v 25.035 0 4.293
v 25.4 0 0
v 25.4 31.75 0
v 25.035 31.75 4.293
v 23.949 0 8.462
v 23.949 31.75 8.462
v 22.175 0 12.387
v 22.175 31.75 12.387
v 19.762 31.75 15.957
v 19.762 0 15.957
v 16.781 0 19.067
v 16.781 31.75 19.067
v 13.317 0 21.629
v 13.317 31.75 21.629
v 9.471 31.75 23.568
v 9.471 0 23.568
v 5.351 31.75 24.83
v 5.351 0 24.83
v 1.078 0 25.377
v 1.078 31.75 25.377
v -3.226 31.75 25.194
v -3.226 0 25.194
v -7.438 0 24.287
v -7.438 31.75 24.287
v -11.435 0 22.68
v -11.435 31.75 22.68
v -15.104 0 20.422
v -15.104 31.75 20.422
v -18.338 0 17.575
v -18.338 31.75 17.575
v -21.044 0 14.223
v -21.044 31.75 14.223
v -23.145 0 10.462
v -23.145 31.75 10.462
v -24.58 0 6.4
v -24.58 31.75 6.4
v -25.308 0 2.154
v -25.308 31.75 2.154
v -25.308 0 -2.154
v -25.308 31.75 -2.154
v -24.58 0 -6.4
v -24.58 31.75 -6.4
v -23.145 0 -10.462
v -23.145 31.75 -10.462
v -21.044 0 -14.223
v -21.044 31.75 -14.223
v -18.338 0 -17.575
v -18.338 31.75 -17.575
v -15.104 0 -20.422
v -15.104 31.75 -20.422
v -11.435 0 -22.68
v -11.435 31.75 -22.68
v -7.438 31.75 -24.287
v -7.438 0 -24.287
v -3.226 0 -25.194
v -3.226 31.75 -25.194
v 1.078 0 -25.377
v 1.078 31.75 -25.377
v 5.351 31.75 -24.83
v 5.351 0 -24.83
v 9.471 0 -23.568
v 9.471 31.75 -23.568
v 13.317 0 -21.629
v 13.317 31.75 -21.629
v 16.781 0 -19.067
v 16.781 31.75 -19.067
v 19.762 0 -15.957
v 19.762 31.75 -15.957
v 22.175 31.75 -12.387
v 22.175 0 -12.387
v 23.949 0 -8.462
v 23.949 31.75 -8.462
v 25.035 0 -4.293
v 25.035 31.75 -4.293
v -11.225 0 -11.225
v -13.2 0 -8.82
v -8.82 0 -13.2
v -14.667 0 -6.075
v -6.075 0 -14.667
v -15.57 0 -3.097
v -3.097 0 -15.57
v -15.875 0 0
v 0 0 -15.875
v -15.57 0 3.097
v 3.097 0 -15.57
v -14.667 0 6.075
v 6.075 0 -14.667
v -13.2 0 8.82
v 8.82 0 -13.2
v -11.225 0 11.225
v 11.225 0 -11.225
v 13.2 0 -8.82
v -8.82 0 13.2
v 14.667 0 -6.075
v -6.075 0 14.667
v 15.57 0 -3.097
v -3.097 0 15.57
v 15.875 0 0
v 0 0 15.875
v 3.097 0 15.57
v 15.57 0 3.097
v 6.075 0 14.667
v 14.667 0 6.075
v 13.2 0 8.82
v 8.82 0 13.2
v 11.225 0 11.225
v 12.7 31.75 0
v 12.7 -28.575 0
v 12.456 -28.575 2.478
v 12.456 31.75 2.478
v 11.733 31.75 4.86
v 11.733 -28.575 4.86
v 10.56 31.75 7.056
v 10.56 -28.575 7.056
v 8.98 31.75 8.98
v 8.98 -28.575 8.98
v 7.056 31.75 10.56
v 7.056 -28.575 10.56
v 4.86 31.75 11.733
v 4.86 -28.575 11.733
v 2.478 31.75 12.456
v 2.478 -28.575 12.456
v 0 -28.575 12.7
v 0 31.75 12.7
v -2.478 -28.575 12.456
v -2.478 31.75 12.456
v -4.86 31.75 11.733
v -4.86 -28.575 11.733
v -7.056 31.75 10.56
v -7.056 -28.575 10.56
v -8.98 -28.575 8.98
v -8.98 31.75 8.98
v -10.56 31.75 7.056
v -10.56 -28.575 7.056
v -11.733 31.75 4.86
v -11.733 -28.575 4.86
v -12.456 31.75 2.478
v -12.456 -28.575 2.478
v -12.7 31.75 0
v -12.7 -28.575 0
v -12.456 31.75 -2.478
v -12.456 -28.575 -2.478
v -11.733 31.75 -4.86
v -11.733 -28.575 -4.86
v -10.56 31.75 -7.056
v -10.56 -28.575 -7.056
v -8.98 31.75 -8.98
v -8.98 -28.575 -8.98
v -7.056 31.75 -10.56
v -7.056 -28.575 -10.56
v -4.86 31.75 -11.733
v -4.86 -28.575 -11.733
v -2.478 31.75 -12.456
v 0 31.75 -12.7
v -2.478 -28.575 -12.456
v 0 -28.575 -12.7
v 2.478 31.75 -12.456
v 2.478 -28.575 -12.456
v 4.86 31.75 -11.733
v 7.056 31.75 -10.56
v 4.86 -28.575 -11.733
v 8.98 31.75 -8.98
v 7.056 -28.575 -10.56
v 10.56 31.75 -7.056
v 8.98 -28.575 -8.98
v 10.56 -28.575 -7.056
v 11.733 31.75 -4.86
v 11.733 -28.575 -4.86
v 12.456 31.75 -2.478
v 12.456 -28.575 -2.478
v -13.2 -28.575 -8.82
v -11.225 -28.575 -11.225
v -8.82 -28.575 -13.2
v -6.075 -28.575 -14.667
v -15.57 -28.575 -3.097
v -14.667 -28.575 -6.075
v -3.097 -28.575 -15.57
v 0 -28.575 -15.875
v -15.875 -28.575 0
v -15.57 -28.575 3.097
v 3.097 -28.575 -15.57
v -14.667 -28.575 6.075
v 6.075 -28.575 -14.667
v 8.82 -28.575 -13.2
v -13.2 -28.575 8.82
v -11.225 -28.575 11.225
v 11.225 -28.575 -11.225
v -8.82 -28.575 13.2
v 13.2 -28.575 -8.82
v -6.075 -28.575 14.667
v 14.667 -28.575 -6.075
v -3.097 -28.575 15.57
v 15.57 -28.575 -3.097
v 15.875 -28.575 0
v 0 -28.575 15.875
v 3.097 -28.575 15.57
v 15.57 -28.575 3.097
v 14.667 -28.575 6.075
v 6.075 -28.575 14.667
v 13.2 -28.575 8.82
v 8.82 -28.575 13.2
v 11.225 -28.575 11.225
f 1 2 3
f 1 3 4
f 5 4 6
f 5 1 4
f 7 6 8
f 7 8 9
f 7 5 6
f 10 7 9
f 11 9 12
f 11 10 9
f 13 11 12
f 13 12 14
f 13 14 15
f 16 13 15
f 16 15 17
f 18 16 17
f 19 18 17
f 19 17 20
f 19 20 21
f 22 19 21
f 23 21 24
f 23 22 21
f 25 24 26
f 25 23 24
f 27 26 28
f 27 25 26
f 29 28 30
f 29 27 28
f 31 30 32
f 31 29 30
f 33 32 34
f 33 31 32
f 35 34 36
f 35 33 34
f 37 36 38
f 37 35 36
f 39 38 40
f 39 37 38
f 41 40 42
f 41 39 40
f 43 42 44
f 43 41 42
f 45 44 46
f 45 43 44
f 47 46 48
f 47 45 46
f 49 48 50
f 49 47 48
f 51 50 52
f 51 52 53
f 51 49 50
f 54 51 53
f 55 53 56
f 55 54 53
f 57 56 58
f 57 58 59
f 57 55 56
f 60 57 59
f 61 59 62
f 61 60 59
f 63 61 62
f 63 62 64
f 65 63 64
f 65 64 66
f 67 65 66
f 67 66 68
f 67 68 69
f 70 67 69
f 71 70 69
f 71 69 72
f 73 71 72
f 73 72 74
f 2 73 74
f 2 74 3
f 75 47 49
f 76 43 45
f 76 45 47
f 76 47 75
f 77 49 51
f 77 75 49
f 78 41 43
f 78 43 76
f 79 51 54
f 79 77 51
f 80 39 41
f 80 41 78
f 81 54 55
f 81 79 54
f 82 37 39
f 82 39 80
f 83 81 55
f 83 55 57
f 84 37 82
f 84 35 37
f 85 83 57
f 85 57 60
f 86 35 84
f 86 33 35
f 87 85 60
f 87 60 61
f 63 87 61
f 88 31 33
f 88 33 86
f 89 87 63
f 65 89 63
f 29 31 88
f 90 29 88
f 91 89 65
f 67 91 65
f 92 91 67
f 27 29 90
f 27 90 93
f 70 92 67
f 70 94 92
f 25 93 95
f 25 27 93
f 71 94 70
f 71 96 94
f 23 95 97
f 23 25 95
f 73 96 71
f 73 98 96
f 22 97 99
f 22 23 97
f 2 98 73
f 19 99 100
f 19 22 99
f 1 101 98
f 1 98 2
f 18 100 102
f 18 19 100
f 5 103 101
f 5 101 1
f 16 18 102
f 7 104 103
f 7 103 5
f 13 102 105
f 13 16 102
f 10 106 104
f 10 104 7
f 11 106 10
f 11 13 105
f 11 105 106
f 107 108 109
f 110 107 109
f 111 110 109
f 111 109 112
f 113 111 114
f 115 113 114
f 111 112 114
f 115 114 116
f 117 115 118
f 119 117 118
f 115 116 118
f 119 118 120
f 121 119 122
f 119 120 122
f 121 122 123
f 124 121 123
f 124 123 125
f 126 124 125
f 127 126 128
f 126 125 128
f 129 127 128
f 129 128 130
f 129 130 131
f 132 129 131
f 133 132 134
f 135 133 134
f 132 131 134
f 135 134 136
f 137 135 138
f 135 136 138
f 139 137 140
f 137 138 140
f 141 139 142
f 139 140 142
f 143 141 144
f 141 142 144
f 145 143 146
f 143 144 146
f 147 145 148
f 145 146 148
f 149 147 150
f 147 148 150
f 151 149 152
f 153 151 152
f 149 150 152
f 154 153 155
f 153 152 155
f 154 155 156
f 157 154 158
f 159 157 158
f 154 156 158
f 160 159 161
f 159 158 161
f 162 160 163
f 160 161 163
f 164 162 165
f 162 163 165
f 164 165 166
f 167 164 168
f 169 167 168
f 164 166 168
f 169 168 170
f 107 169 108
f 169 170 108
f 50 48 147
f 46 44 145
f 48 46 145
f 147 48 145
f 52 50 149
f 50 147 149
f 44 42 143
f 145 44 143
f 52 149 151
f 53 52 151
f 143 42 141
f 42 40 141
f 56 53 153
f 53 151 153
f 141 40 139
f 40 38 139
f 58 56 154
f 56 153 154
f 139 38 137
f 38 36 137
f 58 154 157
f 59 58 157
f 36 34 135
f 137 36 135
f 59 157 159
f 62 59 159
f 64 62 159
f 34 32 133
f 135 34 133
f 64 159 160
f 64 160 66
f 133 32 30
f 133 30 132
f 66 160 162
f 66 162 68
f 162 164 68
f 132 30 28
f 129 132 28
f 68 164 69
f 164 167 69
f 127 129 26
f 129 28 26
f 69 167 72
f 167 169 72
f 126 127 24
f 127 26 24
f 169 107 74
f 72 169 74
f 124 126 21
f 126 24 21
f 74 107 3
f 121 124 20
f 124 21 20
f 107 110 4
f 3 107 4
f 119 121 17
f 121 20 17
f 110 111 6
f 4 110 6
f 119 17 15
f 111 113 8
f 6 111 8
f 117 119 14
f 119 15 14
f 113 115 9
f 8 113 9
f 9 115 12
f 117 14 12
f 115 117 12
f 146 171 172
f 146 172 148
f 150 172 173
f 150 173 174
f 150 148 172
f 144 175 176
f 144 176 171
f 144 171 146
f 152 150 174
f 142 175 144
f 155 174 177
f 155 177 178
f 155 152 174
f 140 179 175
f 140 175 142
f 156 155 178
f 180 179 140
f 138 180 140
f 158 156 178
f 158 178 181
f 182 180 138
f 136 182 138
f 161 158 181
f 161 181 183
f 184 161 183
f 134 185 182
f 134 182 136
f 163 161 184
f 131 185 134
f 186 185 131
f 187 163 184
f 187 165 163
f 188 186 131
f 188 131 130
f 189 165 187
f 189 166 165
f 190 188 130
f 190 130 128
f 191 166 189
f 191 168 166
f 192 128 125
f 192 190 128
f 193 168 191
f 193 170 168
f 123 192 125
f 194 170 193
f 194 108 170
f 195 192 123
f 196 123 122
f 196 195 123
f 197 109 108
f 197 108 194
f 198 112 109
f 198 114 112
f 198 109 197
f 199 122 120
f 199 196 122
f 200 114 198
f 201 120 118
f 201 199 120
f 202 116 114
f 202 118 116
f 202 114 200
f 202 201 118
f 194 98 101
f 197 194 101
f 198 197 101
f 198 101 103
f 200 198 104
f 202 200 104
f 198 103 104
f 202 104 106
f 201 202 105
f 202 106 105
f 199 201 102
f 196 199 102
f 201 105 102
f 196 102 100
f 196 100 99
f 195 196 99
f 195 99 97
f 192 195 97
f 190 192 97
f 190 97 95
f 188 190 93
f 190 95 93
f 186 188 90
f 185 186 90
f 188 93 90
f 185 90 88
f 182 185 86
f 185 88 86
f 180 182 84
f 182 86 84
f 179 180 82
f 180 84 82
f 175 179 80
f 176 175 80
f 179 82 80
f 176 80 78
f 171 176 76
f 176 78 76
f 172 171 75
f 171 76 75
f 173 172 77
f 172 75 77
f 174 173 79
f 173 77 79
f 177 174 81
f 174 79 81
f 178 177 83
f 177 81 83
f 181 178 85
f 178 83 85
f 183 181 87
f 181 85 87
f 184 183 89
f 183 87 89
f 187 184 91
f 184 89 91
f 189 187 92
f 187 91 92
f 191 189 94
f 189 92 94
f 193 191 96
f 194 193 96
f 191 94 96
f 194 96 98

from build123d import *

# Parameters (mm, degrees)
F0_R     = 25.4
F1_DEPTH = 31.75
F2_R     = 15.875
F3_DEPTH = 28.575
F4_R     = 12.7
F5_DEPTH = 60.325


with BuildPart() as f1:
    # F0 (on Front) → F1 (new body)
    with BuildSketch(Plane.XZ):
        Circle(F0_R)
    extrude(amount=-F1_DEPTH)

    # F2 (on face) → F3 (join)
    with BuildSketch(Plane.XZ):
        Circle(F2_R)
    extrude(amount=F3_DEPTH)

    # F4 (on face) → F5 (cut)
    with BuildSketch(Plane.XZ.offset(28.575)):
        Circle(F4_R)
    extrude(amount=-F5_DEPTH, mode=Mode.SUBTRACT)


solid = f1.part
